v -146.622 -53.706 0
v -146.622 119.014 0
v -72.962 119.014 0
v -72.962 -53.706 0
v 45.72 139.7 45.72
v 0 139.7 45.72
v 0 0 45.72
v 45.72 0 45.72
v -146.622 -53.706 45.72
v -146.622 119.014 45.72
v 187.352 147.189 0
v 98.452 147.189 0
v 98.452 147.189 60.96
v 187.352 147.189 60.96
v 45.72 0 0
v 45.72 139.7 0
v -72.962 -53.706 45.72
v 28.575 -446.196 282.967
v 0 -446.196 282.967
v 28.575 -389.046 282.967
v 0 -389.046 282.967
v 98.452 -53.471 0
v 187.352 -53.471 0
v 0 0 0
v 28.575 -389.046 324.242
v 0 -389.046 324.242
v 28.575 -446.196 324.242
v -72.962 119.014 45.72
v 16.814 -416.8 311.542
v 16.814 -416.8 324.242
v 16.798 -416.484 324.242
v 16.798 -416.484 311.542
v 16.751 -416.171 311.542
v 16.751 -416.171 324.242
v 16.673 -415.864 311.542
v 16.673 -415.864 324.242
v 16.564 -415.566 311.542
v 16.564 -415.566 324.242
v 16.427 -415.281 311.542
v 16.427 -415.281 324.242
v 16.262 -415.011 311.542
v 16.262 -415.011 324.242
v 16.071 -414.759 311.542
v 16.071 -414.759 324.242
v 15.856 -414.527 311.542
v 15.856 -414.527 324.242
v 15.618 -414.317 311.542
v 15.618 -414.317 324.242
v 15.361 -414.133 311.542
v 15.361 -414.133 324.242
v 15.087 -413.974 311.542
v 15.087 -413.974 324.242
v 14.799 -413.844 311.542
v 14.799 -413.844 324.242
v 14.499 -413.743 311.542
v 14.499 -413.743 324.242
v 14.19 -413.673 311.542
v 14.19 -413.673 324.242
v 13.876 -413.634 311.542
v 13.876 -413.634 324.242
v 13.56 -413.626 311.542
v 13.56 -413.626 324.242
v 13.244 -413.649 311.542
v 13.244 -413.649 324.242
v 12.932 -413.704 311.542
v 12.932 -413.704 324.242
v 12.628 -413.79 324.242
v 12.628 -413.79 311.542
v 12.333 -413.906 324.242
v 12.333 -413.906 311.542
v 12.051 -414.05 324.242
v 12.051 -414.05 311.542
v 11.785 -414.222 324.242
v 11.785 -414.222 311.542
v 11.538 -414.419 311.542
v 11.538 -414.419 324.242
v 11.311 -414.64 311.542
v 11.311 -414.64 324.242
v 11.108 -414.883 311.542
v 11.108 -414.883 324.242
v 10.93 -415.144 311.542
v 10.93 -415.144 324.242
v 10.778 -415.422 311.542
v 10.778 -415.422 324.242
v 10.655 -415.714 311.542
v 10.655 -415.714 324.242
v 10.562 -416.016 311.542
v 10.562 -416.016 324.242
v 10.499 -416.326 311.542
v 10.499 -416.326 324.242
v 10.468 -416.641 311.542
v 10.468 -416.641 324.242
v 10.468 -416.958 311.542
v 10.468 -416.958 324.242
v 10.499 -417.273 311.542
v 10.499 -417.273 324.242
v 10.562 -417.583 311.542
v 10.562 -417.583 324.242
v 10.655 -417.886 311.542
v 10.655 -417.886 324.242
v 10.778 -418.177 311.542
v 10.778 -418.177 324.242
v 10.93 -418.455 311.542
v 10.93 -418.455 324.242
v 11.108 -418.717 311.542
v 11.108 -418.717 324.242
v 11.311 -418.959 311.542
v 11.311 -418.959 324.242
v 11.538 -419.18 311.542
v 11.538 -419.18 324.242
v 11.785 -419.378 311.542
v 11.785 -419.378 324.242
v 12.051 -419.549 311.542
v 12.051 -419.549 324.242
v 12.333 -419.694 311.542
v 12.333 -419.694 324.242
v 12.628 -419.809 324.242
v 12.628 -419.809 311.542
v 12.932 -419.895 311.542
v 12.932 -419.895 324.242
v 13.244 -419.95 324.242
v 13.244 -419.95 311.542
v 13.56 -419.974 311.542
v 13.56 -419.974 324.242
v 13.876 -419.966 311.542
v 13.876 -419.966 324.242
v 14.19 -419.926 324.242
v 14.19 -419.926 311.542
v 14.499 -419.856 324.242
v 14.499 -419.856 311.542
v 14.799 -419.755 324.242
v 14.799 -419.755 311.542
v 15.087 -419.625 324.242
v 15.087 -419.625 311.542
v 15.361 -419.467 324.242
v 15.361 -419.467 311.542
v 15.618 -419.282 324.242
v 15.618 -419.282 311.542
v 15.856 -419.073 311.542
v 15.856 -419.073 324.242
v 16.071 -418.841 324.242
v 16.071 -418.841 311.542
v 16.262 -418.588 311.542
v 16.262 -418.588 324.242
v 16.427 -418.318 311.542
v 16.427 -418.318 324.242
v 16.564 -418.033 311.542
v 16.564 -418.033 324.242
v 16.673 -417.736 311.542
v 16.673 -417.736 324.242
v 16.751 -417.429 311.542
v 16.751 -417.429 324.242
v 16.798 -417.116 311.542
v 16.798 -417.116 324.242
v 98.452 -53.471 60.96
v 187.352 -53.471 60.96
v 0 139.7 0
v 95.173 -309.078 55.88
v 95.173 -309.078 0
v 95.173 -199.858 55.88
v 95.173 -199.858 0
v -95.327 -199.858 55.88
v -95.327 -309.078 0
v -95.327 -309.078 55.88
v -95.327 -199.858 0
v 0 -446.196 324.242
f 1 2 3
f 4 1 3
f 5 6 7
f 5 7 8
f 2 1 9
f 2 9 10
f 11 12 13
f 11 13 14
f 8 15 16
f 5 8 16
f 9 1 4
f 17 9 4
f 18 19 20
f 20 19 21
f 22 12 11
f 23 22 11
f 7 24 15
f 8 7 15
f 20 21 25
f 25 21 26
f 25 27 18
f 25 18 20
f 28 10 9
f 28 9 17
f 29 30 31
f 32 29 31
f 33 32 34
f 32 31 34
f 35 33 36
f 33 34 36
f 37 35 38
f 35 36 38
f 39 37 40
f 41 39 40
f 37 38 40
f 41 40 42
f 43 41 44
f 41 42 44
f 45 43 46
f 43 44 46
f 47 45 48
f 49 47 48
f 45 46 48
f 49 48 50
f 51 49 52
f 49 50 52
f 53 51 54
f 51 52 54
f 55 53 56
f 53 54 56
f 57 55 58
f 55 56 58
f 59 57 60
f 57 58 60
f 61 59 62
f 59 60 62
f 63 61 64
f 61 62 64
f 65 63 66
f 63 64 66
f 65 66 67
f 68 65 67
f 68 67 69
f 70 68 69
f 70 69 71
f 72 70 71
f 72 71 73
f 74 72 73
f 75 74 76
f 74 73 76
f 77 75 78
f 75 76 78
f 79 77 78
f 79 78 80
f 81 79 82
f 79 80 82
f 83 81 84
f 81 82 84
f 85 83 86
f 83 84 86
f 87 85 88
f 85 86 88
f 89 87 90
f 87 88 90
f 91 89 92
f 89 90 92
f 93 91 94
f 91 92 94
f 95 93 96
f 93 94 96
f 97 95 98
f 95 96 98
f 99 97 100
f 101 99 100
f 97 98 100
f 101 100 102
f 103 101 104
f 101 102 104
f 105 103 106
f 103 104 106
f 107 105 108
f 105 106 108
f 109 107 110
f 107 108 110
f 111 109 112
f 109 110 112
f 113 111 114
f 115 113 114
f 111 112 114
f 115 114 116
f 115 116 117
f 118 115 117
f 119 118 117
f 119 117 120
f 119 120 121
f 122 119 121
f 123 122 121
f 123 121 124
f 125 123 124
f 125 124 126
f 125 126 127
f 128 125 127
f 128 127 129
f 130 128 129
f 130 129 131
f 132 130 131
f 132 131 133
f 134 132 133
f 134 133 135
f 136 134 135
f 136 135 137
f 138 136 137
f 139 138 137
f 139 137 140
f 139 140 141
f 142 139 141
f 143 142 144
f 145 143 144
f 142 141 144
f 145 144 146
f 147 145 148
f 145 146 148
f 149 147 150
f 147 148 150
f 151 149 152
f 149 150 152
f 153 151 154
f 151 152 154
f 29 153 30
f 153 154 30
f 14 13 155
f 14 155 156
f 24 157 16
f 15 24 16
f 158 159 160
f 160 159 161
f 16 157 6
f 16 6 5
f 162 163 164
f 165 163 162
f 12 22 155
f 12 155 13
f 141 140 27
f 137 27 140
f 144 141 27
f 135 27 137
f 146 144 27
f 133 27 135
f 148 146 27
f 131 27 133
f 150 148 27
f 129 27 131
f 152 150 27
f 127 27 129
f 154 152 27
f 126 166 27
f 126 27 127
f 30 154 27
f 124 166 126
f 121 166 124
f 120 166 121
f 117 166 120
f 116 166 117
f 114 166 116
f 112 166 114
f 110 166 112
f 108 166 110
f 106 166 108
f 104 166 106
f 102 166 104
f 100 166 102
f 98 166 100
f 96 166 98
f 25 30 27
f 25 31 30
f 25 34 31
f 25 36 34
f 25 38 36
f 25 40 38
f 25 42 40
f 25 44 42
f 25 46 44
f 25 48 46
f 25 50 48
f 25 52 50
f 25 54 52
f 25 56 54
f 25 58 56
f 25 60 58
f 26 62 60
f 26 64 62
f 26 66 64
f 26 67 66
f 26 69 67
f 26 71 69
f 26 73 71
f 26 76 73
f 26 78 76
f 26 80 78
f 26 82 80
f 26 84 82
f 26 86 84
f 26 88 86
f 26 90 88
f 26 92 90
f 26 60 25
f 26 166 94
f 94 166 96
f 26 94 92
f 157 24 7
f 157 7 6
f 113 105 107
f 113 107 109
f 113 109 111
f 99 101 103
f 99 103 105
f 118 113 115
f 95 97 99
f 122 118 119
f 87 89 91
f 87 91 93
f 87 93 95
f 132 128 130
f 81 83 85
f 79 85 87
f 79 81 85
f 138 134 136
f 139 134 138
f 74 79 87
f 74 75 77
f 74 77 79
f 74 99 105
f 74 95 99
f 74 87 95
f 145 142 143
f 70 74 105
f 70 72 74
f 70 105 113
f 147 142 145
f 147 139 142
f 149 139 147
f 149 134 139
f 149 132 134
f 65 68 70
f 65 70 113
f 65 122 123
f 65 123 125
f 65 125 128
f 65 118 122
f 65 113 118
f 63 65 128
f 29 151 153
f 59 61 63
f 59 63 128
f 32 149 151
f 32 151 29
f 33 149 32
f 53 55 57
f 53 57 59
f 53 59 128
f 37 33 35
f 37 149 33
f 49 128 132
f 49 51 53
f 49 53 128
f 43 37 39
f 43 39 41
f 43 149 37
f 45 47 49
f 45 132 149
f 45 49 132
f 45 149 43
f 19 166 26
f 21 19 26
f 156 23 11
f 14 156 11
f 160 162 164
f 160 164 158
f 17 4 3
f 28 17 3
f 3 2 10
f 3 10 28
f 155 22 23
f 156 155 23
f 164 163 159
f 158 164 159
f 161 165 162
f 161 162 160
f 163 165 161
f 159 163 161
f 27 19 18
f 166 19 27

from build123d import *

# Parameters (mm, degrees)
F0_W      = 45.72
F0_H      = 139.7
F1_DEPTH  = 45.72
F2_W      = 73.66
F2_H      = 172.72
F3_DEPTH  = 45.72
F4_W      = 88.9
F4_H      = 200.66
F5_DEPTH  = 60.96
F6_W      = 190.5
F6_H      = 109.22
F7_DEPTH  = 55.88
F8_W      = 57.15
F8_H      = 41.275
F9_DEPTH  = 28.575
F10_R     = 3.175
F11_DEPTH = 12.7


with BuildPart() as f1:
    # F0 (on Top) → F1 (new body)
    with BuildSketch(Plane.XY):
        with Locations((22.86, 69.85)):
            Rectangle(F0_W, F0_H)
    extrude(amount=F1_DEPTH)


with BuildPart() as f3:
    # F2 (on Top) → F3 (new body)
    with BuildSketch(Plane.XY):
        with Locations((-109.792436, 32.653842)):
            Rectangle(F2_W, F2_H)
    extrude(amount=F3_DEPTH)


with BuildPart() as f5:
    # F4 (on Top) → F5 (new body)
    with BuildSketch(Plane.XY):
        with Locations((142.90189, 46.859073)):
            Rectangle(F4_W, F4_H)
    extrude(amount=F5_DEPTH)


with BuildPart() as f7:
    # F6 (on Top) → F7 (new body)
    with BuildSketch(Plane.XY):
        with Locations((-0.077095, -254.467794)):
            Rectangle(F6_W, F6_H)
    extrude(amount=F7_DEPTH)


with BuildPart() as f9:
    # F8 (on Right) → F9 (new body)
    with BuildSketch(Plane.YZ):
        with Locations((-417.620629, 303.6042)):
            Rectangle(F8_W, F8_H)
    extrude(amount=F9_DEPTH)

    # F10 (on face) → F11 (cut)
    with BuildSketch(Plane.XY.offset(324.2417)):
        with Locations((13.638811, -416.799664)):
            Circle(F10_R)
    extrude(amount=-F11_DEPTH, mode=Mode.SUBTRACT)


solid = Compound([f1.part, f3.part, f5.part, f7.part, f9.part])
